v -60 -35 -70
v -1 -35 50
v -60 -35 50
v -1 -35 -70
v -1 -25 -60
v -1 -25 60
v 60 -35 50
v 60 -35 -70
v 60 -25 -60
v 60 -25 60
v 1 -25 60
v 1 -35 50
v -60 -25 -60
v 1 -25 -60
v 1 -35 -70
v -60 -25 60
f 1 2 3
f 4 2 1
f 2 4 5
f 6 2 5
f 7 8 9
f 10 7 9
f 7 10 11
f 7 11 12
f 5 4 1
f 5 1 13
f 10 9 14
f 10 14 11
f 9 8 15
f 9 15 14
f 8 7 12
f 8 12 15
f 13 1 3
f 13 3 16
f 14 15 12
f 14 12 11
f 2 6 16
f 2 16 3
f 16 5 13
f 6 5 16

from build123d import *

# Parameters (mm, degrees)
F1_DEPTH = 60
F3_DEPTH = 1


with BuildPart() as f1:
    # F0 (on Right) → F1 (new body, symmetric)
    with BuildSketch(Plane.YZ):
        Polygon((-25, -60), (-25, -5), (-35, -5), (-35, -70), align=None)
        Polygon((-35, -5), (-25, -5), (-25, 60), (-35, 50), align=None)
    extrude(amount=F1_DEPTH, both=True)

    # F2 (on Right) → F3 (cut, symmetric)
    with BuildSketch(Plane.YZ):
        Polygon((-35, 65), (-35, -75), (-25, -75), (-25, -10), (-25, 65), align=None)
    extrude(amount=F3_DEPTH, both=True, mode=Mode.SUBTRACT)


solid = f1.part
